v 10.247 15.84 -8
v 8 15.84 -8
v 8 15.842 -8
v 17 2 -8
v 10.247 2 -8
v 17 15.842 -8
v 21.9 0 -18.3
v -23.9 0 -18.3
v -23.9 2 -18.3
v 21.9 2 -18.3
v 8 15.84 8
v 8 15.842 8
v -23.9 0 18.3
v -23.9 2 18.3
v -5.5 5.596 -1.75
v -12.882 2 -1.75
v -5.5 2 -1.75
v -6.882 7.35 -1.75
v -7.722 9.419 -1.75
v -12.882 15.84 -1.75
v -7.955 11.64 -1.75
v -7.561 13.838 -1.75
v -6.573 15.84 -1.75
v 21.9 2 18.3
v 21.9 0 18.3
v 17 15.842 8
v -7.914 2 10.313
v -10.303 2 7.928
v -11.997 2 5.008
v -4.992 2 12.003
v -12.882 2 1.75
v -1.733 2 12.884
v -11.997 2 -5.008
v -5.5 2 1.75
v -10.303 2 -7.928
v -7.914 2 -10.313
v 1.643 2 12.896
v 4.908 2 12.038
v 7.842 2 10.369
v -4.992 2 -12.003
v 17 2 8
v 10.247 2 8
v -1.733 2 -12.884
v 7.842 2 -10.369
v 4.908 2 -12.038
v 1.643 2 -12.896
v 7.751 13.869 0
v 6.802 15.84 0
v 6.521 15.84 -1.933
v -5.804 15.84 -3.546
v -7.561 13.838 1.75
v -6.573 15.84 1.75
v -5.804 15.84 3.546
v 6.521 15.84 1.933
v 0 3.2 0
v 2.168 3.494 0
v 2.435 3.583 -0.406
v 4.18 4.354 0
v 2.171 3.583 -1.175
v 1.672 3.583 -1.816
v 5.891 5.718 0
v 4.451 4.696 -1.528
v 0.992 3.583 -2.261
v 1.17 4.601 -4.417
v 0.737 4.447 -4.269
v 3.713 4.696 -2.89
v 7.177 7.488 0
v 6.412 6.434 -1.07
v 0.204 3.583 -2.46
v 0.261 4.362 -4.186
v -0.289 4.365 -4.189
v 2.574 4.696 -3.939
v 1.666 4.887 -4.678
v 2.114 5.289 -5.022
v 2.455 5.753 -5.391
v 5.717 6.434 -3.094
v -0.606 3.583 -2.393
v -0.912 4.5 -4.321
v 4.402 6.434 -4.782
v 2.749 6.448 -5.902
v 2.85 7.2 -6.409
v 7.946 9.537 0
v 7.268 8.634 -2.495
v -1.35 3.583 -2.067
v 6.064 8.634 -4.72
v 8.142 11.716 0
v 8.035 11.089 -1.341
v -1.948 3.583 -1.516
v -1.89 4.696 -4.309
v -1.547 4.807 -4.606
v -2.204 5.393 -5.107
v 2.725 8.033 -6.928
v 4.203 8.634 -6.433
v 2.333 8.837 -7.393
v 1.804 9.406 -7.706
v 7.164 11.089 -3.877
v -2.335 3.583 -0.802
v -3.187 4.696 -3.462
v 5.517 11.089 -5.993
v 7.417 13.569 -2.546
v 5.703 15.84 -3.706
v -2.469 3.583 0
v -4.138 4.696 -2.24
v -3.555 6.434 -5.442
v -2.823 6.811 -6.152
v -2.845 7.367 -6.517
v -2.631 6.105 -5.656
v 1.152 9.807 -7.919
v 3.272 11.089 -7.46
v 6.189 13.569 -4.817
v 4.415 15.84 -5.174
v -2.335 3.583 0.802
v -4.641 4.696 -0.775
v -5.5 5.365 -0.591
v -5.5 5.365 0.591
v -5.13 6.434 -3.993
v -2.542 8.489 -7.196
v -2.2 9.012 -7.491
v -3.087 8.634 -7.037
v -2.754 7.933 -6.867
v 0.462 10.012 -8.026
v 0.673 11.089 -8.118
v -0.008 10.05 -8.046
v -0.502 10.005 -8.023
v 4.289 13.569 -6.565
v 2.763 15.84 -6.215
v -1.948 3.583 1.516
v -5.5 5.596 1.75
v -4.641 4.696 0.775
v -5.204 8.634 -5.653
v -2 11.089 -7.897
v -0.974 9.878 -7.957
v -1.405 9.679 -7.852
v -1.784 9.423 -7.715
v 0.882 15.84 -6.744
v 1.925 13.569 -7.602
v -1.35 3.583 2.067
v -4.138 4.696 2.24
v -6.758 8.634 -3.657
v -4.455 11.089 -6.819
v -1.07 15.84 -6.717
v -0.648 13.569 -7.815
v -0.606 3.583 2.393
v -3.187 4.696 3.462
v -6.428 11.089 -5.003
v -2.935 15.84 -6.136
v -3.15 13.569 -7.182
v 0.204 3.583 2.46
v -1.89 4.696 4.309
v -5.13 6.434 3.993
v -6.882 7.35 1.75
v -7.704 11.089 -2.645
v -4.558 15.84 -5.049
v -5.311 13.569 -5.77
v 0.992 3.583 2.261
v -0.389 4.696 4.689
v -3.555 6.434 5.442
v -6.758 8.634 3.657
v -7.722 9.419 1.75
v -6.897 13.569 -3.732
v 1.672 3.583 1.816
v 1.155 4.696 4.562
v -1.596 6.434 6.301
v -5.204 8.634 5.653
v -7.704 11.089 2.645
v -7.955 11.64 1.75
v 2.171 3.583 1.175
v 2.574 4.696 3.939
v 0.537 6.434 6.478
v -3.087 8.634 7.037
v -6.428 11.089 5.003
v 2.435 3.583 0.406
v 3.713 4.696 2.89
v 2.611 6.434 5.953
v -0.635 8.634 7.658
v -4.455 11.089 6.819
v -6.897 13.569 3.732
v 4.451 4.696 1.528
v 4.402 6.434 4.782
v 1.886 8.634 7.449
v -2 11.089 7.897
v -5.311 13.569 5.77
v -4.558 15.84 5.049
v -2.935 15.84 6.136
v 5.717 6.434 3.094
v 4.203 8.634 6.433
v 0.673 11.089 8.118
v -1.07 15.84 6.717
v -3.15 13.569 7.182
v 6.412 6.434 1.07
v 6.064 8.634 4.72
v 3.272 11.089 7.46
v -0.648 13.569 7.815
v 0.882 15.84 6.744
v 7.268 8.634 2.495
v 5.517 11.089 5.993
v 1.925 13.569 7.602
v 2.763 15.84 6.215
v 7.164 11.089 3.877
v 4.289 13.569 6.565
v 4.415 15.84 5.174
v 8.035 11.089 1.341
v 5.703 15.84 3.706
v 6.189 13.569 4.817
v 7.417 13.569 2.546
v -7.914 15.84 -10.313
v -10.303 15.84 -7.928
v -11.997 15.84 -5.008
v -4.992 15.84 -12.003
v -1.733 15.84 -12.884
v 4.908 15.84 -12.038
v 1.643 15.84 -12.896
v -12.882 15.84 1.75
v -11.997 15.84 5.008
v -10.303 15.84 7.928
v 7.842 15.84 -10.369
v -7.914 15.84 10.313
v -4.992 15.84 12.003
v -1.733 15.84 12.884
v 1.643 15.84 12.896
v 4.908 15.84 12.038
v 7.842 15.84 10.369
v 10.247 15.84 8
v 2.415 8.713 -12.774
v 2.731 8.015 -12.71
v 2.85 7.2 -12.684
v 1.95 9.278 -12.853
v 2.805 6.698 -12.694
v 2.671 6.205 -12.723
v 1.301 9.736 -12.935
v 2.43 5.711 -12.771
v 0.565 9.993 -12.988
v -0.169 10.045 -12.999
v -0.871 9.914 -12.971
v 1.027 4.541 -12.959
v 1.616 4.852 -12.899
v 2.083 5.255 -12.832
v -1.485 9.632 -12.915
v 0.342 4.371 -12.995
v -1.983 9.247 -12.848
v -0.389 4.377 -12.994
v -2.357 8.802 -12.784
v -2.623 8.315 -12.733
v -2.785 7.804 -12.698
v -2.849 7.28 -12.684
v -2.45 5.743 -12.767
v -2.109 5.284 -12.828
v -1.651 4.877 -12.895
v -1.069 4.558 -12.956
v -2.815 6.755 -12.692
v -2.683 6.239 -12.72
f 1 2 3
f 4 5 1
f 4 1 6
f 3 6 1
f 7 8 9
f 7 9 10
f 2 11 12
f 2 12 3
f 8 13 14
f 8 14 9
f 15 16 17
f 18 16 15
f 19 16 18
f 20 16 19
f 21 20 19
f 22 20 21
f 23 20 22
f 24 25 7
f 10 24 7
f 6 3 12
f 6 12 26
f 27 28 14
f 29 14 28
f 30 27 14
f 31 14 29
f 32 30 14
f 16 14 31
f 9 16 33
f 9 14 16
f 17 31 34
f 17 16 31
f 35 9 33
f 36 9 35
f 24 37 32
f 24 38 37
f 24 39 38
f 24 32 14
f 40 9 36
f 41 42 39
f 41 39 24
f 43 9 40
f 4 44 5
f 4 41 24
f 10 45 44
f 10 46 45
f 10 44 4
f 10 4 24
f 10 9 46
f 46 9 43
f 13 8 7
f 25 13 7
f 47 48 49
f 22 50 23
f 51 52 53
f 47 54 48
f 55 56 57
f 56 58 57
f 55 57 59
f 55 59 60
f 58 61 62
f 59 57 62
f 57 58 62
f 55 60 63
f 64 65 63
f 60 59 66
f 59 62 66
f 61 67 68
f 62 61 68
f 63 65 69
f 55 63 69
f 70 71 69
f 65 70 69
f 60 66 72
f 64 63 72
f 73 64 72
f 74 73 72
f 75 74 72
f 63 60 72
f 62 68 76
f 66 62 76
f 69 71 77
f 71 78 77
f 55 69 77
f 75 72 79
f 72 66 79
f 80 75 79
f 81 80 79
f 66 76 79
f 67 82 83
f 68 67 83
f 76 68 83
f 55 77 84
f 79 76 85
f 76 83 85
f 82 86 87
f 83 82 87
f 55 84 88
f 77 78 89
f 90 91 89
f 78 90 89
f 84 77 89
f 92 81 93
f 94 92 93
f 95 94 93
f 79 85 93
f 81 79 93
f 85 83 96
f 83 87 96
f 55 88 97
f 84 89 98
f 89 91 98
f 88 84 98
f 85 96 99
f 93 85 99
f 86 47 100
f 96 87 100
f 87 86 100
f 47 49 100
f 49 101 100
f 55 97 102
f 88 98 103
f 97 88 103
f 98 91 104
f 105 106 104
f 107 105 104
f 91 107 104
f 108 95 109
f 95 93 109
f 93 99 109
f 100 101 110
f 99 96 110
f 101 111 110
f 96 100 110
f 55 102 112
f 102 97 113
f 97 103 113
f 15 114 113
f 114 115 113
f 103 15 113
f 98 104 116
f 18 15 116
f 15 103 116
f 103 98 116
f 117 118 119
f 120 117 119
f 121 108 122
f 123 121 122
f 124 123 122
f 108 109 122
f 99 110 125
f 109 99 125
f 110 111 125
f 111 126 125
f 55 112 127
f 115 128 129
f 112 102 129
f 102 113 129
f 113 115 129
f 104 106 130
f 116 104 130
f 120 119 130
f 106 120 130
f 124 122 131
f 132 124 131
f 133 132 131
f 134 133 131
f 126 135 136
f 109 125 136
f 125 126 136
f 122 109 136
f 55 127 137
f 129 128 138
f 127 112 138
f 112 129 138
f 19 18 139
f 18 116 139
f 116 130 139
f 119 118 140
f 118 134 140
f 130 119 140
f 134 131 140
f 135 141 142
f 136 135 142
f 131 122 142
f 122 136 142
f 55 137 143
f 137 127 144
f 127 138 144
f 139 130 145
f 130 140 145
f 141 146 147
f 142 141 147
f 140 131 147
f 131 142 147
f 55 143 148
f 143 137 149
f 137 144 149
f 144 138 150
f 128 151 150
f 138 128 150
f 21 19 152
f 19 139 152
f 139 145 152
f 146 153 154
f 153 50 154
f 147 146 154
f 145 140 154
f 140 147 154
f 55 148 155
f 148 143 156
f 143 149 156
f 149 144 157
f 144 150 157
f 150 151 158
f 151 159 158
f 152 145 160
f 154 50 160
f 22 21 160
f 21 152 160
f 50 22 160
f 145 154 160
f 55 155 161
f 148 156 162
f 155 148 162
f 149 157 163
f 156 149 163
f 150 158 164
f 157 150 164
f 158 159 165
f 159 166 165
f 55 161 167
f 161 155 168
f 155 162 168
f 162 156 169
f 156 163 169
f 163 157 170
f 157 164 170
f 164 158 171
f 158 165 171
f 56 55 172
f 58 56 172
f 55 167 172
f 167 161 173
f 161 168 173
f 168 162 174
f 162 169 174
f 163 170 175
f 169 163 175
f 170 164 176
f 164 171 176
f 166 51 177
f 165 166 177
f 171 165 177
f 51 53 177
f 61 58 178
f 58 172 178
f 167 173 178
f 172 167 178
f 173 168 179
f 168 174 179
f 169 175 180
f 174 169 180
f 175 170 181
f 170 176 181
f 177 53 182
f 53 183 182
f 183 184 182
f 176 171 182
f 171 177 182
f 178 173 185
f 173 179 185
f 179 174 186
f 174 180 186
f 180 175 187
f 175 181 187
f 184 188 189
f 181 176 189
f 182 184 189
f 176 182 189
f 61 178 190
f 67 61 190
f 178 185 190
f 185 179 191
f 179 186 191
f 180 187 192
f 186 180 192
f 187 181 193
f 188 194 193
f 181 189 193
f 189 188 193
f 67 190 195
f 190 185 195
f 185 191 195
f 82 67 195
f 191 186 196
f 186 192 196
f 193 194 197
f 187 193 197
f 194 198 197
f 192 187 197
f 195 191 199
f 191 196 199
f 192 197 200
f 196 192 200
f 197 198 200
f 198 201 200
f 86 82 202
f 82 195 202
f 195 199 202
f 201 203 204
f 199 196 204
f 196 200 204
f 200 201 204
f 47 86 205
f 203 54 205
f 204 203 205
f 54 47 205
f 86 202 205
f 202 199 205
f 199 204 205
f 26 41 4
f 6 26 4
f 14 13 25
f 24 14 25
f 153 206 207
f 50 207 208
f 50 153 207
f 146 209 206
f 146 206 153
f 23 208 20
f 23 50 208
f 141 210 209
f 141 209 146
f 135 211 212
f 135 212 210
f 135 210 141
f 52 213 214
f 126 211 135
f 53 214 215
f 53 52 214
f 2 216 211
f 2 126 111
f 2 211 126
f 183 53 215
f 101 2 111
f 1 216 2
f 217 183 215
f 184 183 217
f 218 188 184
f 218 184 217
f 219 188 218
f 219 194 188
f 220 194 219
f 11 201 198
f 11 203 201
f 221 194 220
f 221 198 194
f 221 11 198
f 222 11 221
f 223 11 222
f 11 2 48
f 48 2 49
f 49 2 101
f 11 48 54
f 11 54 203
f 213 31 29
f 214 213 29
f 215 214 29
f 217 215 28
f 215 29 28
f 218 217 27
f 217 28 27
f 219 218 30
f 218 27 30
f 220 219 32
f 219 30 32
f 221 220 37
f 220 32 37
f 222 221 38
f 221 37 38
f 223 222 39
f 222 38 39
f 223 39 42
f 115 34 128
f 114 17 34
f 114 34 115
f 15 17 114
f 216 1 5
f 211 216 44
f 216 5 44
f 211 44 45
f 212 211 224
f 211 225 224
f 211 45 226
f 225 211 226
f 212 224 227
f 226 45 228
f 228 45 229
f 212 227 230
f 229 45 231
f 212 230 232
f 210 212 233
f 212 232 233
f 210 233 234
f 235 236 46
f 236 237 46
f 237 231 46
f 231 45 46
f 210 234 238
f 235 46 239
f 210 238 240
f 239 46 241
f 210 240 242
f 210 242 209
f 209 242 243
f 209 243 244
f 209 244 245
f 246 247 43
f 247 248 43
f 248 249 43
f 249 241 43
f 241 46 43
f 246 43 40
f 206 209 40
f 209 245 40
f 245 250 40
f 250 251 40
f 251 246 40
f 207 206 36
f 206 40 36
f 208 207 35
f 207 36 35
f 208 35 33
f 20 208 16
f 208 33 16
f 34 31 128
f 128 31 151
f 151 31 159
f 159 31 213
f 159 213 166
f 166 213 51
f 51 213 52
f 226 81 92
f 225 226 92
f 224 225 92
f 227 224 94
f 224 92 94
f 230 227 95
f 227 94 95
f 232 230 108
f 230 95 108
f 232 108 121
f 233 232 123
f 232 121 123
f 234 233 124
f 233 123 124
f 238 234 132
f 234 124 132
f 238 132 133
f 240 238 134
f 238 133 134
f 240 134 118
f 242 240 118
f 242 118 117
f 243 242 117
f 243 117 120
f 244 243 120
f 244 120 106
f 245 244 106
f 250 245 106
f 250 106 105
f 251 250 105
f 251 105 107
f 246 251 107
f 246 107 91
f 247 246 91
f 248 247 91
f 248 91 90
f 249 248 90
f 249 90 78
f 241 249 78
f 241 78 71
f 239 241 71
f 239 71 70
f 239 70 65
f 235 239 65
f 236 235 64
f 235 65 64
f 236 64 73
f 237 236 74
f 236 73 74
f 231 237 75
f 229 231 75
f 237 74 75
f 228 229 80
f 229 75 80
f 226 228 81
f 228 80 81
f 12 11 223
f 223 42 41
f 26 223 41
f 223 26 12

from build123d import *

# Parameters (mm, degrees)
SKETCH1_W               = 45.8
SKETCH1_H               = 36.6
BOSS_EXTRUDE1_DEPTH     = 2
SKETCH2_R               = 13
BOSS_EXTRUDE2_DEPTH     = 13.84
SKETCH5_W               = 9
SKETCH5_H               = 16
BOSS_EXTRUDE3_DEPTH     = 13.84249374
CUT_EXTRUDE2_REACH      = 36.016
CUT_EXTRUDE2_END_RADIUS = 13
SKETCH7_R               = 2.85
CUT_EXTRUDE3_DEPTH      = 1.75
CUT_EXTRUDE3_DEPTH_BACK = 1.75
SKETCH9_W               = 7.5
SKETCH9_H               = 13.84


with BuildPart() as part:
    # Sketch1 → Boss-Extrude1 (new body)
    with BuildSketch(Plane(origin=(0, 0, 0), x_dir=(1, 0, 0), z_dir=(0, 1, 0))):
        with Locations((-1, 0)):
            Rectangle(SKETCH1_W, SKETCH1_H)
    extrude(amount=BOSS_EXTRUDE1_DEPTH)

    # Sketch2 → Boss-Extrude2 (add)
    with BuildSketch(Plane(origin=(0, 2, 0), x_dir=(1, 0, 0), z_dir=(0, 1, 0))):
        with Locations(Location((0, 0, 0), (0, 0, 270))):
            Circle(SKETCH2_R)
    extrude(amount=BOSS_EXTRUDE2_DEPTH)

    # Sketch5 → Boss-Extrude3 (add)
    with BuildSketch(Plane(origin=(0, 2, 0), x_dir=(1, 0, 0), z_dir=(0, 1, 0))):
        with Locations((12.5, 0)):
            Rectangle(SKETCH5_W, SKETCH5_H)
    extrude(amount=BOSS_EXTRUDE3_DEPTH)

    # Sketch6 → Cut-Revolve1 (revolve, cut)
    with BuildSketch(Plane.XY):
        with BuildLine():
            Line((0, 19.5), (0, 3.2))
            ThreePointArc((0, 3.2), (8.15, 11.35), (0, 19.5))
        make_face()
    revolve(axis=Axis((0, 3.2, 0), (0, 1, 0)), mode=Mode.SUBTRACT)

    # Cut-Extrude2: up to this cylinder (the profile starts inside it)
    cut_extrude2_end = Plane(origin=(0, 7.2, 0), z_dir=(0, -1, 0)) * Cylinder(CUT_EXTRUDE2_END_RADIUS, 99.032, mode=Mode.PRIVATE)
    # Sketch7 → Cut-Extrude2 (cut, up to the surface)
    with BuildSketch(Plane.XY, mode=Mode.PRIVATE) as cut_extrude2_sk1:
        with Locations((0, 7.2)):
            Circle(SKETCH7_R)
    cut_extrude2_tool1 = extrude(cut_extrude2_sk1.sketch, amount=-CUT_EXTRUDE2_REACH, mode=Mode.PRIVATE) & cut_extrude2_end
    add(cut_extrude2_tool1.solids().sort_by_distance((0, 7.2, 0))[0], mode=Mode.SUBTRACT)

    # Sketch9 → Cut-Extrude3 (cut, two sides: drawn at the far end of the back side and taken through both)
    with BuildSketch(Plane.XY.offset(-CUT_EXTRUDE3_DEPTH_BACK)):
        with Locations((-9.25, 8.92)):
            Rectangle(SKETCH9_W, SKETCH9_H)
    extrude(amount=CUT_EXTRUDE3_DEPTH + CUT_EXTRUDE3_DEPTH_BACK, mode=Mode.SUBTRACT)


solid = part.part
